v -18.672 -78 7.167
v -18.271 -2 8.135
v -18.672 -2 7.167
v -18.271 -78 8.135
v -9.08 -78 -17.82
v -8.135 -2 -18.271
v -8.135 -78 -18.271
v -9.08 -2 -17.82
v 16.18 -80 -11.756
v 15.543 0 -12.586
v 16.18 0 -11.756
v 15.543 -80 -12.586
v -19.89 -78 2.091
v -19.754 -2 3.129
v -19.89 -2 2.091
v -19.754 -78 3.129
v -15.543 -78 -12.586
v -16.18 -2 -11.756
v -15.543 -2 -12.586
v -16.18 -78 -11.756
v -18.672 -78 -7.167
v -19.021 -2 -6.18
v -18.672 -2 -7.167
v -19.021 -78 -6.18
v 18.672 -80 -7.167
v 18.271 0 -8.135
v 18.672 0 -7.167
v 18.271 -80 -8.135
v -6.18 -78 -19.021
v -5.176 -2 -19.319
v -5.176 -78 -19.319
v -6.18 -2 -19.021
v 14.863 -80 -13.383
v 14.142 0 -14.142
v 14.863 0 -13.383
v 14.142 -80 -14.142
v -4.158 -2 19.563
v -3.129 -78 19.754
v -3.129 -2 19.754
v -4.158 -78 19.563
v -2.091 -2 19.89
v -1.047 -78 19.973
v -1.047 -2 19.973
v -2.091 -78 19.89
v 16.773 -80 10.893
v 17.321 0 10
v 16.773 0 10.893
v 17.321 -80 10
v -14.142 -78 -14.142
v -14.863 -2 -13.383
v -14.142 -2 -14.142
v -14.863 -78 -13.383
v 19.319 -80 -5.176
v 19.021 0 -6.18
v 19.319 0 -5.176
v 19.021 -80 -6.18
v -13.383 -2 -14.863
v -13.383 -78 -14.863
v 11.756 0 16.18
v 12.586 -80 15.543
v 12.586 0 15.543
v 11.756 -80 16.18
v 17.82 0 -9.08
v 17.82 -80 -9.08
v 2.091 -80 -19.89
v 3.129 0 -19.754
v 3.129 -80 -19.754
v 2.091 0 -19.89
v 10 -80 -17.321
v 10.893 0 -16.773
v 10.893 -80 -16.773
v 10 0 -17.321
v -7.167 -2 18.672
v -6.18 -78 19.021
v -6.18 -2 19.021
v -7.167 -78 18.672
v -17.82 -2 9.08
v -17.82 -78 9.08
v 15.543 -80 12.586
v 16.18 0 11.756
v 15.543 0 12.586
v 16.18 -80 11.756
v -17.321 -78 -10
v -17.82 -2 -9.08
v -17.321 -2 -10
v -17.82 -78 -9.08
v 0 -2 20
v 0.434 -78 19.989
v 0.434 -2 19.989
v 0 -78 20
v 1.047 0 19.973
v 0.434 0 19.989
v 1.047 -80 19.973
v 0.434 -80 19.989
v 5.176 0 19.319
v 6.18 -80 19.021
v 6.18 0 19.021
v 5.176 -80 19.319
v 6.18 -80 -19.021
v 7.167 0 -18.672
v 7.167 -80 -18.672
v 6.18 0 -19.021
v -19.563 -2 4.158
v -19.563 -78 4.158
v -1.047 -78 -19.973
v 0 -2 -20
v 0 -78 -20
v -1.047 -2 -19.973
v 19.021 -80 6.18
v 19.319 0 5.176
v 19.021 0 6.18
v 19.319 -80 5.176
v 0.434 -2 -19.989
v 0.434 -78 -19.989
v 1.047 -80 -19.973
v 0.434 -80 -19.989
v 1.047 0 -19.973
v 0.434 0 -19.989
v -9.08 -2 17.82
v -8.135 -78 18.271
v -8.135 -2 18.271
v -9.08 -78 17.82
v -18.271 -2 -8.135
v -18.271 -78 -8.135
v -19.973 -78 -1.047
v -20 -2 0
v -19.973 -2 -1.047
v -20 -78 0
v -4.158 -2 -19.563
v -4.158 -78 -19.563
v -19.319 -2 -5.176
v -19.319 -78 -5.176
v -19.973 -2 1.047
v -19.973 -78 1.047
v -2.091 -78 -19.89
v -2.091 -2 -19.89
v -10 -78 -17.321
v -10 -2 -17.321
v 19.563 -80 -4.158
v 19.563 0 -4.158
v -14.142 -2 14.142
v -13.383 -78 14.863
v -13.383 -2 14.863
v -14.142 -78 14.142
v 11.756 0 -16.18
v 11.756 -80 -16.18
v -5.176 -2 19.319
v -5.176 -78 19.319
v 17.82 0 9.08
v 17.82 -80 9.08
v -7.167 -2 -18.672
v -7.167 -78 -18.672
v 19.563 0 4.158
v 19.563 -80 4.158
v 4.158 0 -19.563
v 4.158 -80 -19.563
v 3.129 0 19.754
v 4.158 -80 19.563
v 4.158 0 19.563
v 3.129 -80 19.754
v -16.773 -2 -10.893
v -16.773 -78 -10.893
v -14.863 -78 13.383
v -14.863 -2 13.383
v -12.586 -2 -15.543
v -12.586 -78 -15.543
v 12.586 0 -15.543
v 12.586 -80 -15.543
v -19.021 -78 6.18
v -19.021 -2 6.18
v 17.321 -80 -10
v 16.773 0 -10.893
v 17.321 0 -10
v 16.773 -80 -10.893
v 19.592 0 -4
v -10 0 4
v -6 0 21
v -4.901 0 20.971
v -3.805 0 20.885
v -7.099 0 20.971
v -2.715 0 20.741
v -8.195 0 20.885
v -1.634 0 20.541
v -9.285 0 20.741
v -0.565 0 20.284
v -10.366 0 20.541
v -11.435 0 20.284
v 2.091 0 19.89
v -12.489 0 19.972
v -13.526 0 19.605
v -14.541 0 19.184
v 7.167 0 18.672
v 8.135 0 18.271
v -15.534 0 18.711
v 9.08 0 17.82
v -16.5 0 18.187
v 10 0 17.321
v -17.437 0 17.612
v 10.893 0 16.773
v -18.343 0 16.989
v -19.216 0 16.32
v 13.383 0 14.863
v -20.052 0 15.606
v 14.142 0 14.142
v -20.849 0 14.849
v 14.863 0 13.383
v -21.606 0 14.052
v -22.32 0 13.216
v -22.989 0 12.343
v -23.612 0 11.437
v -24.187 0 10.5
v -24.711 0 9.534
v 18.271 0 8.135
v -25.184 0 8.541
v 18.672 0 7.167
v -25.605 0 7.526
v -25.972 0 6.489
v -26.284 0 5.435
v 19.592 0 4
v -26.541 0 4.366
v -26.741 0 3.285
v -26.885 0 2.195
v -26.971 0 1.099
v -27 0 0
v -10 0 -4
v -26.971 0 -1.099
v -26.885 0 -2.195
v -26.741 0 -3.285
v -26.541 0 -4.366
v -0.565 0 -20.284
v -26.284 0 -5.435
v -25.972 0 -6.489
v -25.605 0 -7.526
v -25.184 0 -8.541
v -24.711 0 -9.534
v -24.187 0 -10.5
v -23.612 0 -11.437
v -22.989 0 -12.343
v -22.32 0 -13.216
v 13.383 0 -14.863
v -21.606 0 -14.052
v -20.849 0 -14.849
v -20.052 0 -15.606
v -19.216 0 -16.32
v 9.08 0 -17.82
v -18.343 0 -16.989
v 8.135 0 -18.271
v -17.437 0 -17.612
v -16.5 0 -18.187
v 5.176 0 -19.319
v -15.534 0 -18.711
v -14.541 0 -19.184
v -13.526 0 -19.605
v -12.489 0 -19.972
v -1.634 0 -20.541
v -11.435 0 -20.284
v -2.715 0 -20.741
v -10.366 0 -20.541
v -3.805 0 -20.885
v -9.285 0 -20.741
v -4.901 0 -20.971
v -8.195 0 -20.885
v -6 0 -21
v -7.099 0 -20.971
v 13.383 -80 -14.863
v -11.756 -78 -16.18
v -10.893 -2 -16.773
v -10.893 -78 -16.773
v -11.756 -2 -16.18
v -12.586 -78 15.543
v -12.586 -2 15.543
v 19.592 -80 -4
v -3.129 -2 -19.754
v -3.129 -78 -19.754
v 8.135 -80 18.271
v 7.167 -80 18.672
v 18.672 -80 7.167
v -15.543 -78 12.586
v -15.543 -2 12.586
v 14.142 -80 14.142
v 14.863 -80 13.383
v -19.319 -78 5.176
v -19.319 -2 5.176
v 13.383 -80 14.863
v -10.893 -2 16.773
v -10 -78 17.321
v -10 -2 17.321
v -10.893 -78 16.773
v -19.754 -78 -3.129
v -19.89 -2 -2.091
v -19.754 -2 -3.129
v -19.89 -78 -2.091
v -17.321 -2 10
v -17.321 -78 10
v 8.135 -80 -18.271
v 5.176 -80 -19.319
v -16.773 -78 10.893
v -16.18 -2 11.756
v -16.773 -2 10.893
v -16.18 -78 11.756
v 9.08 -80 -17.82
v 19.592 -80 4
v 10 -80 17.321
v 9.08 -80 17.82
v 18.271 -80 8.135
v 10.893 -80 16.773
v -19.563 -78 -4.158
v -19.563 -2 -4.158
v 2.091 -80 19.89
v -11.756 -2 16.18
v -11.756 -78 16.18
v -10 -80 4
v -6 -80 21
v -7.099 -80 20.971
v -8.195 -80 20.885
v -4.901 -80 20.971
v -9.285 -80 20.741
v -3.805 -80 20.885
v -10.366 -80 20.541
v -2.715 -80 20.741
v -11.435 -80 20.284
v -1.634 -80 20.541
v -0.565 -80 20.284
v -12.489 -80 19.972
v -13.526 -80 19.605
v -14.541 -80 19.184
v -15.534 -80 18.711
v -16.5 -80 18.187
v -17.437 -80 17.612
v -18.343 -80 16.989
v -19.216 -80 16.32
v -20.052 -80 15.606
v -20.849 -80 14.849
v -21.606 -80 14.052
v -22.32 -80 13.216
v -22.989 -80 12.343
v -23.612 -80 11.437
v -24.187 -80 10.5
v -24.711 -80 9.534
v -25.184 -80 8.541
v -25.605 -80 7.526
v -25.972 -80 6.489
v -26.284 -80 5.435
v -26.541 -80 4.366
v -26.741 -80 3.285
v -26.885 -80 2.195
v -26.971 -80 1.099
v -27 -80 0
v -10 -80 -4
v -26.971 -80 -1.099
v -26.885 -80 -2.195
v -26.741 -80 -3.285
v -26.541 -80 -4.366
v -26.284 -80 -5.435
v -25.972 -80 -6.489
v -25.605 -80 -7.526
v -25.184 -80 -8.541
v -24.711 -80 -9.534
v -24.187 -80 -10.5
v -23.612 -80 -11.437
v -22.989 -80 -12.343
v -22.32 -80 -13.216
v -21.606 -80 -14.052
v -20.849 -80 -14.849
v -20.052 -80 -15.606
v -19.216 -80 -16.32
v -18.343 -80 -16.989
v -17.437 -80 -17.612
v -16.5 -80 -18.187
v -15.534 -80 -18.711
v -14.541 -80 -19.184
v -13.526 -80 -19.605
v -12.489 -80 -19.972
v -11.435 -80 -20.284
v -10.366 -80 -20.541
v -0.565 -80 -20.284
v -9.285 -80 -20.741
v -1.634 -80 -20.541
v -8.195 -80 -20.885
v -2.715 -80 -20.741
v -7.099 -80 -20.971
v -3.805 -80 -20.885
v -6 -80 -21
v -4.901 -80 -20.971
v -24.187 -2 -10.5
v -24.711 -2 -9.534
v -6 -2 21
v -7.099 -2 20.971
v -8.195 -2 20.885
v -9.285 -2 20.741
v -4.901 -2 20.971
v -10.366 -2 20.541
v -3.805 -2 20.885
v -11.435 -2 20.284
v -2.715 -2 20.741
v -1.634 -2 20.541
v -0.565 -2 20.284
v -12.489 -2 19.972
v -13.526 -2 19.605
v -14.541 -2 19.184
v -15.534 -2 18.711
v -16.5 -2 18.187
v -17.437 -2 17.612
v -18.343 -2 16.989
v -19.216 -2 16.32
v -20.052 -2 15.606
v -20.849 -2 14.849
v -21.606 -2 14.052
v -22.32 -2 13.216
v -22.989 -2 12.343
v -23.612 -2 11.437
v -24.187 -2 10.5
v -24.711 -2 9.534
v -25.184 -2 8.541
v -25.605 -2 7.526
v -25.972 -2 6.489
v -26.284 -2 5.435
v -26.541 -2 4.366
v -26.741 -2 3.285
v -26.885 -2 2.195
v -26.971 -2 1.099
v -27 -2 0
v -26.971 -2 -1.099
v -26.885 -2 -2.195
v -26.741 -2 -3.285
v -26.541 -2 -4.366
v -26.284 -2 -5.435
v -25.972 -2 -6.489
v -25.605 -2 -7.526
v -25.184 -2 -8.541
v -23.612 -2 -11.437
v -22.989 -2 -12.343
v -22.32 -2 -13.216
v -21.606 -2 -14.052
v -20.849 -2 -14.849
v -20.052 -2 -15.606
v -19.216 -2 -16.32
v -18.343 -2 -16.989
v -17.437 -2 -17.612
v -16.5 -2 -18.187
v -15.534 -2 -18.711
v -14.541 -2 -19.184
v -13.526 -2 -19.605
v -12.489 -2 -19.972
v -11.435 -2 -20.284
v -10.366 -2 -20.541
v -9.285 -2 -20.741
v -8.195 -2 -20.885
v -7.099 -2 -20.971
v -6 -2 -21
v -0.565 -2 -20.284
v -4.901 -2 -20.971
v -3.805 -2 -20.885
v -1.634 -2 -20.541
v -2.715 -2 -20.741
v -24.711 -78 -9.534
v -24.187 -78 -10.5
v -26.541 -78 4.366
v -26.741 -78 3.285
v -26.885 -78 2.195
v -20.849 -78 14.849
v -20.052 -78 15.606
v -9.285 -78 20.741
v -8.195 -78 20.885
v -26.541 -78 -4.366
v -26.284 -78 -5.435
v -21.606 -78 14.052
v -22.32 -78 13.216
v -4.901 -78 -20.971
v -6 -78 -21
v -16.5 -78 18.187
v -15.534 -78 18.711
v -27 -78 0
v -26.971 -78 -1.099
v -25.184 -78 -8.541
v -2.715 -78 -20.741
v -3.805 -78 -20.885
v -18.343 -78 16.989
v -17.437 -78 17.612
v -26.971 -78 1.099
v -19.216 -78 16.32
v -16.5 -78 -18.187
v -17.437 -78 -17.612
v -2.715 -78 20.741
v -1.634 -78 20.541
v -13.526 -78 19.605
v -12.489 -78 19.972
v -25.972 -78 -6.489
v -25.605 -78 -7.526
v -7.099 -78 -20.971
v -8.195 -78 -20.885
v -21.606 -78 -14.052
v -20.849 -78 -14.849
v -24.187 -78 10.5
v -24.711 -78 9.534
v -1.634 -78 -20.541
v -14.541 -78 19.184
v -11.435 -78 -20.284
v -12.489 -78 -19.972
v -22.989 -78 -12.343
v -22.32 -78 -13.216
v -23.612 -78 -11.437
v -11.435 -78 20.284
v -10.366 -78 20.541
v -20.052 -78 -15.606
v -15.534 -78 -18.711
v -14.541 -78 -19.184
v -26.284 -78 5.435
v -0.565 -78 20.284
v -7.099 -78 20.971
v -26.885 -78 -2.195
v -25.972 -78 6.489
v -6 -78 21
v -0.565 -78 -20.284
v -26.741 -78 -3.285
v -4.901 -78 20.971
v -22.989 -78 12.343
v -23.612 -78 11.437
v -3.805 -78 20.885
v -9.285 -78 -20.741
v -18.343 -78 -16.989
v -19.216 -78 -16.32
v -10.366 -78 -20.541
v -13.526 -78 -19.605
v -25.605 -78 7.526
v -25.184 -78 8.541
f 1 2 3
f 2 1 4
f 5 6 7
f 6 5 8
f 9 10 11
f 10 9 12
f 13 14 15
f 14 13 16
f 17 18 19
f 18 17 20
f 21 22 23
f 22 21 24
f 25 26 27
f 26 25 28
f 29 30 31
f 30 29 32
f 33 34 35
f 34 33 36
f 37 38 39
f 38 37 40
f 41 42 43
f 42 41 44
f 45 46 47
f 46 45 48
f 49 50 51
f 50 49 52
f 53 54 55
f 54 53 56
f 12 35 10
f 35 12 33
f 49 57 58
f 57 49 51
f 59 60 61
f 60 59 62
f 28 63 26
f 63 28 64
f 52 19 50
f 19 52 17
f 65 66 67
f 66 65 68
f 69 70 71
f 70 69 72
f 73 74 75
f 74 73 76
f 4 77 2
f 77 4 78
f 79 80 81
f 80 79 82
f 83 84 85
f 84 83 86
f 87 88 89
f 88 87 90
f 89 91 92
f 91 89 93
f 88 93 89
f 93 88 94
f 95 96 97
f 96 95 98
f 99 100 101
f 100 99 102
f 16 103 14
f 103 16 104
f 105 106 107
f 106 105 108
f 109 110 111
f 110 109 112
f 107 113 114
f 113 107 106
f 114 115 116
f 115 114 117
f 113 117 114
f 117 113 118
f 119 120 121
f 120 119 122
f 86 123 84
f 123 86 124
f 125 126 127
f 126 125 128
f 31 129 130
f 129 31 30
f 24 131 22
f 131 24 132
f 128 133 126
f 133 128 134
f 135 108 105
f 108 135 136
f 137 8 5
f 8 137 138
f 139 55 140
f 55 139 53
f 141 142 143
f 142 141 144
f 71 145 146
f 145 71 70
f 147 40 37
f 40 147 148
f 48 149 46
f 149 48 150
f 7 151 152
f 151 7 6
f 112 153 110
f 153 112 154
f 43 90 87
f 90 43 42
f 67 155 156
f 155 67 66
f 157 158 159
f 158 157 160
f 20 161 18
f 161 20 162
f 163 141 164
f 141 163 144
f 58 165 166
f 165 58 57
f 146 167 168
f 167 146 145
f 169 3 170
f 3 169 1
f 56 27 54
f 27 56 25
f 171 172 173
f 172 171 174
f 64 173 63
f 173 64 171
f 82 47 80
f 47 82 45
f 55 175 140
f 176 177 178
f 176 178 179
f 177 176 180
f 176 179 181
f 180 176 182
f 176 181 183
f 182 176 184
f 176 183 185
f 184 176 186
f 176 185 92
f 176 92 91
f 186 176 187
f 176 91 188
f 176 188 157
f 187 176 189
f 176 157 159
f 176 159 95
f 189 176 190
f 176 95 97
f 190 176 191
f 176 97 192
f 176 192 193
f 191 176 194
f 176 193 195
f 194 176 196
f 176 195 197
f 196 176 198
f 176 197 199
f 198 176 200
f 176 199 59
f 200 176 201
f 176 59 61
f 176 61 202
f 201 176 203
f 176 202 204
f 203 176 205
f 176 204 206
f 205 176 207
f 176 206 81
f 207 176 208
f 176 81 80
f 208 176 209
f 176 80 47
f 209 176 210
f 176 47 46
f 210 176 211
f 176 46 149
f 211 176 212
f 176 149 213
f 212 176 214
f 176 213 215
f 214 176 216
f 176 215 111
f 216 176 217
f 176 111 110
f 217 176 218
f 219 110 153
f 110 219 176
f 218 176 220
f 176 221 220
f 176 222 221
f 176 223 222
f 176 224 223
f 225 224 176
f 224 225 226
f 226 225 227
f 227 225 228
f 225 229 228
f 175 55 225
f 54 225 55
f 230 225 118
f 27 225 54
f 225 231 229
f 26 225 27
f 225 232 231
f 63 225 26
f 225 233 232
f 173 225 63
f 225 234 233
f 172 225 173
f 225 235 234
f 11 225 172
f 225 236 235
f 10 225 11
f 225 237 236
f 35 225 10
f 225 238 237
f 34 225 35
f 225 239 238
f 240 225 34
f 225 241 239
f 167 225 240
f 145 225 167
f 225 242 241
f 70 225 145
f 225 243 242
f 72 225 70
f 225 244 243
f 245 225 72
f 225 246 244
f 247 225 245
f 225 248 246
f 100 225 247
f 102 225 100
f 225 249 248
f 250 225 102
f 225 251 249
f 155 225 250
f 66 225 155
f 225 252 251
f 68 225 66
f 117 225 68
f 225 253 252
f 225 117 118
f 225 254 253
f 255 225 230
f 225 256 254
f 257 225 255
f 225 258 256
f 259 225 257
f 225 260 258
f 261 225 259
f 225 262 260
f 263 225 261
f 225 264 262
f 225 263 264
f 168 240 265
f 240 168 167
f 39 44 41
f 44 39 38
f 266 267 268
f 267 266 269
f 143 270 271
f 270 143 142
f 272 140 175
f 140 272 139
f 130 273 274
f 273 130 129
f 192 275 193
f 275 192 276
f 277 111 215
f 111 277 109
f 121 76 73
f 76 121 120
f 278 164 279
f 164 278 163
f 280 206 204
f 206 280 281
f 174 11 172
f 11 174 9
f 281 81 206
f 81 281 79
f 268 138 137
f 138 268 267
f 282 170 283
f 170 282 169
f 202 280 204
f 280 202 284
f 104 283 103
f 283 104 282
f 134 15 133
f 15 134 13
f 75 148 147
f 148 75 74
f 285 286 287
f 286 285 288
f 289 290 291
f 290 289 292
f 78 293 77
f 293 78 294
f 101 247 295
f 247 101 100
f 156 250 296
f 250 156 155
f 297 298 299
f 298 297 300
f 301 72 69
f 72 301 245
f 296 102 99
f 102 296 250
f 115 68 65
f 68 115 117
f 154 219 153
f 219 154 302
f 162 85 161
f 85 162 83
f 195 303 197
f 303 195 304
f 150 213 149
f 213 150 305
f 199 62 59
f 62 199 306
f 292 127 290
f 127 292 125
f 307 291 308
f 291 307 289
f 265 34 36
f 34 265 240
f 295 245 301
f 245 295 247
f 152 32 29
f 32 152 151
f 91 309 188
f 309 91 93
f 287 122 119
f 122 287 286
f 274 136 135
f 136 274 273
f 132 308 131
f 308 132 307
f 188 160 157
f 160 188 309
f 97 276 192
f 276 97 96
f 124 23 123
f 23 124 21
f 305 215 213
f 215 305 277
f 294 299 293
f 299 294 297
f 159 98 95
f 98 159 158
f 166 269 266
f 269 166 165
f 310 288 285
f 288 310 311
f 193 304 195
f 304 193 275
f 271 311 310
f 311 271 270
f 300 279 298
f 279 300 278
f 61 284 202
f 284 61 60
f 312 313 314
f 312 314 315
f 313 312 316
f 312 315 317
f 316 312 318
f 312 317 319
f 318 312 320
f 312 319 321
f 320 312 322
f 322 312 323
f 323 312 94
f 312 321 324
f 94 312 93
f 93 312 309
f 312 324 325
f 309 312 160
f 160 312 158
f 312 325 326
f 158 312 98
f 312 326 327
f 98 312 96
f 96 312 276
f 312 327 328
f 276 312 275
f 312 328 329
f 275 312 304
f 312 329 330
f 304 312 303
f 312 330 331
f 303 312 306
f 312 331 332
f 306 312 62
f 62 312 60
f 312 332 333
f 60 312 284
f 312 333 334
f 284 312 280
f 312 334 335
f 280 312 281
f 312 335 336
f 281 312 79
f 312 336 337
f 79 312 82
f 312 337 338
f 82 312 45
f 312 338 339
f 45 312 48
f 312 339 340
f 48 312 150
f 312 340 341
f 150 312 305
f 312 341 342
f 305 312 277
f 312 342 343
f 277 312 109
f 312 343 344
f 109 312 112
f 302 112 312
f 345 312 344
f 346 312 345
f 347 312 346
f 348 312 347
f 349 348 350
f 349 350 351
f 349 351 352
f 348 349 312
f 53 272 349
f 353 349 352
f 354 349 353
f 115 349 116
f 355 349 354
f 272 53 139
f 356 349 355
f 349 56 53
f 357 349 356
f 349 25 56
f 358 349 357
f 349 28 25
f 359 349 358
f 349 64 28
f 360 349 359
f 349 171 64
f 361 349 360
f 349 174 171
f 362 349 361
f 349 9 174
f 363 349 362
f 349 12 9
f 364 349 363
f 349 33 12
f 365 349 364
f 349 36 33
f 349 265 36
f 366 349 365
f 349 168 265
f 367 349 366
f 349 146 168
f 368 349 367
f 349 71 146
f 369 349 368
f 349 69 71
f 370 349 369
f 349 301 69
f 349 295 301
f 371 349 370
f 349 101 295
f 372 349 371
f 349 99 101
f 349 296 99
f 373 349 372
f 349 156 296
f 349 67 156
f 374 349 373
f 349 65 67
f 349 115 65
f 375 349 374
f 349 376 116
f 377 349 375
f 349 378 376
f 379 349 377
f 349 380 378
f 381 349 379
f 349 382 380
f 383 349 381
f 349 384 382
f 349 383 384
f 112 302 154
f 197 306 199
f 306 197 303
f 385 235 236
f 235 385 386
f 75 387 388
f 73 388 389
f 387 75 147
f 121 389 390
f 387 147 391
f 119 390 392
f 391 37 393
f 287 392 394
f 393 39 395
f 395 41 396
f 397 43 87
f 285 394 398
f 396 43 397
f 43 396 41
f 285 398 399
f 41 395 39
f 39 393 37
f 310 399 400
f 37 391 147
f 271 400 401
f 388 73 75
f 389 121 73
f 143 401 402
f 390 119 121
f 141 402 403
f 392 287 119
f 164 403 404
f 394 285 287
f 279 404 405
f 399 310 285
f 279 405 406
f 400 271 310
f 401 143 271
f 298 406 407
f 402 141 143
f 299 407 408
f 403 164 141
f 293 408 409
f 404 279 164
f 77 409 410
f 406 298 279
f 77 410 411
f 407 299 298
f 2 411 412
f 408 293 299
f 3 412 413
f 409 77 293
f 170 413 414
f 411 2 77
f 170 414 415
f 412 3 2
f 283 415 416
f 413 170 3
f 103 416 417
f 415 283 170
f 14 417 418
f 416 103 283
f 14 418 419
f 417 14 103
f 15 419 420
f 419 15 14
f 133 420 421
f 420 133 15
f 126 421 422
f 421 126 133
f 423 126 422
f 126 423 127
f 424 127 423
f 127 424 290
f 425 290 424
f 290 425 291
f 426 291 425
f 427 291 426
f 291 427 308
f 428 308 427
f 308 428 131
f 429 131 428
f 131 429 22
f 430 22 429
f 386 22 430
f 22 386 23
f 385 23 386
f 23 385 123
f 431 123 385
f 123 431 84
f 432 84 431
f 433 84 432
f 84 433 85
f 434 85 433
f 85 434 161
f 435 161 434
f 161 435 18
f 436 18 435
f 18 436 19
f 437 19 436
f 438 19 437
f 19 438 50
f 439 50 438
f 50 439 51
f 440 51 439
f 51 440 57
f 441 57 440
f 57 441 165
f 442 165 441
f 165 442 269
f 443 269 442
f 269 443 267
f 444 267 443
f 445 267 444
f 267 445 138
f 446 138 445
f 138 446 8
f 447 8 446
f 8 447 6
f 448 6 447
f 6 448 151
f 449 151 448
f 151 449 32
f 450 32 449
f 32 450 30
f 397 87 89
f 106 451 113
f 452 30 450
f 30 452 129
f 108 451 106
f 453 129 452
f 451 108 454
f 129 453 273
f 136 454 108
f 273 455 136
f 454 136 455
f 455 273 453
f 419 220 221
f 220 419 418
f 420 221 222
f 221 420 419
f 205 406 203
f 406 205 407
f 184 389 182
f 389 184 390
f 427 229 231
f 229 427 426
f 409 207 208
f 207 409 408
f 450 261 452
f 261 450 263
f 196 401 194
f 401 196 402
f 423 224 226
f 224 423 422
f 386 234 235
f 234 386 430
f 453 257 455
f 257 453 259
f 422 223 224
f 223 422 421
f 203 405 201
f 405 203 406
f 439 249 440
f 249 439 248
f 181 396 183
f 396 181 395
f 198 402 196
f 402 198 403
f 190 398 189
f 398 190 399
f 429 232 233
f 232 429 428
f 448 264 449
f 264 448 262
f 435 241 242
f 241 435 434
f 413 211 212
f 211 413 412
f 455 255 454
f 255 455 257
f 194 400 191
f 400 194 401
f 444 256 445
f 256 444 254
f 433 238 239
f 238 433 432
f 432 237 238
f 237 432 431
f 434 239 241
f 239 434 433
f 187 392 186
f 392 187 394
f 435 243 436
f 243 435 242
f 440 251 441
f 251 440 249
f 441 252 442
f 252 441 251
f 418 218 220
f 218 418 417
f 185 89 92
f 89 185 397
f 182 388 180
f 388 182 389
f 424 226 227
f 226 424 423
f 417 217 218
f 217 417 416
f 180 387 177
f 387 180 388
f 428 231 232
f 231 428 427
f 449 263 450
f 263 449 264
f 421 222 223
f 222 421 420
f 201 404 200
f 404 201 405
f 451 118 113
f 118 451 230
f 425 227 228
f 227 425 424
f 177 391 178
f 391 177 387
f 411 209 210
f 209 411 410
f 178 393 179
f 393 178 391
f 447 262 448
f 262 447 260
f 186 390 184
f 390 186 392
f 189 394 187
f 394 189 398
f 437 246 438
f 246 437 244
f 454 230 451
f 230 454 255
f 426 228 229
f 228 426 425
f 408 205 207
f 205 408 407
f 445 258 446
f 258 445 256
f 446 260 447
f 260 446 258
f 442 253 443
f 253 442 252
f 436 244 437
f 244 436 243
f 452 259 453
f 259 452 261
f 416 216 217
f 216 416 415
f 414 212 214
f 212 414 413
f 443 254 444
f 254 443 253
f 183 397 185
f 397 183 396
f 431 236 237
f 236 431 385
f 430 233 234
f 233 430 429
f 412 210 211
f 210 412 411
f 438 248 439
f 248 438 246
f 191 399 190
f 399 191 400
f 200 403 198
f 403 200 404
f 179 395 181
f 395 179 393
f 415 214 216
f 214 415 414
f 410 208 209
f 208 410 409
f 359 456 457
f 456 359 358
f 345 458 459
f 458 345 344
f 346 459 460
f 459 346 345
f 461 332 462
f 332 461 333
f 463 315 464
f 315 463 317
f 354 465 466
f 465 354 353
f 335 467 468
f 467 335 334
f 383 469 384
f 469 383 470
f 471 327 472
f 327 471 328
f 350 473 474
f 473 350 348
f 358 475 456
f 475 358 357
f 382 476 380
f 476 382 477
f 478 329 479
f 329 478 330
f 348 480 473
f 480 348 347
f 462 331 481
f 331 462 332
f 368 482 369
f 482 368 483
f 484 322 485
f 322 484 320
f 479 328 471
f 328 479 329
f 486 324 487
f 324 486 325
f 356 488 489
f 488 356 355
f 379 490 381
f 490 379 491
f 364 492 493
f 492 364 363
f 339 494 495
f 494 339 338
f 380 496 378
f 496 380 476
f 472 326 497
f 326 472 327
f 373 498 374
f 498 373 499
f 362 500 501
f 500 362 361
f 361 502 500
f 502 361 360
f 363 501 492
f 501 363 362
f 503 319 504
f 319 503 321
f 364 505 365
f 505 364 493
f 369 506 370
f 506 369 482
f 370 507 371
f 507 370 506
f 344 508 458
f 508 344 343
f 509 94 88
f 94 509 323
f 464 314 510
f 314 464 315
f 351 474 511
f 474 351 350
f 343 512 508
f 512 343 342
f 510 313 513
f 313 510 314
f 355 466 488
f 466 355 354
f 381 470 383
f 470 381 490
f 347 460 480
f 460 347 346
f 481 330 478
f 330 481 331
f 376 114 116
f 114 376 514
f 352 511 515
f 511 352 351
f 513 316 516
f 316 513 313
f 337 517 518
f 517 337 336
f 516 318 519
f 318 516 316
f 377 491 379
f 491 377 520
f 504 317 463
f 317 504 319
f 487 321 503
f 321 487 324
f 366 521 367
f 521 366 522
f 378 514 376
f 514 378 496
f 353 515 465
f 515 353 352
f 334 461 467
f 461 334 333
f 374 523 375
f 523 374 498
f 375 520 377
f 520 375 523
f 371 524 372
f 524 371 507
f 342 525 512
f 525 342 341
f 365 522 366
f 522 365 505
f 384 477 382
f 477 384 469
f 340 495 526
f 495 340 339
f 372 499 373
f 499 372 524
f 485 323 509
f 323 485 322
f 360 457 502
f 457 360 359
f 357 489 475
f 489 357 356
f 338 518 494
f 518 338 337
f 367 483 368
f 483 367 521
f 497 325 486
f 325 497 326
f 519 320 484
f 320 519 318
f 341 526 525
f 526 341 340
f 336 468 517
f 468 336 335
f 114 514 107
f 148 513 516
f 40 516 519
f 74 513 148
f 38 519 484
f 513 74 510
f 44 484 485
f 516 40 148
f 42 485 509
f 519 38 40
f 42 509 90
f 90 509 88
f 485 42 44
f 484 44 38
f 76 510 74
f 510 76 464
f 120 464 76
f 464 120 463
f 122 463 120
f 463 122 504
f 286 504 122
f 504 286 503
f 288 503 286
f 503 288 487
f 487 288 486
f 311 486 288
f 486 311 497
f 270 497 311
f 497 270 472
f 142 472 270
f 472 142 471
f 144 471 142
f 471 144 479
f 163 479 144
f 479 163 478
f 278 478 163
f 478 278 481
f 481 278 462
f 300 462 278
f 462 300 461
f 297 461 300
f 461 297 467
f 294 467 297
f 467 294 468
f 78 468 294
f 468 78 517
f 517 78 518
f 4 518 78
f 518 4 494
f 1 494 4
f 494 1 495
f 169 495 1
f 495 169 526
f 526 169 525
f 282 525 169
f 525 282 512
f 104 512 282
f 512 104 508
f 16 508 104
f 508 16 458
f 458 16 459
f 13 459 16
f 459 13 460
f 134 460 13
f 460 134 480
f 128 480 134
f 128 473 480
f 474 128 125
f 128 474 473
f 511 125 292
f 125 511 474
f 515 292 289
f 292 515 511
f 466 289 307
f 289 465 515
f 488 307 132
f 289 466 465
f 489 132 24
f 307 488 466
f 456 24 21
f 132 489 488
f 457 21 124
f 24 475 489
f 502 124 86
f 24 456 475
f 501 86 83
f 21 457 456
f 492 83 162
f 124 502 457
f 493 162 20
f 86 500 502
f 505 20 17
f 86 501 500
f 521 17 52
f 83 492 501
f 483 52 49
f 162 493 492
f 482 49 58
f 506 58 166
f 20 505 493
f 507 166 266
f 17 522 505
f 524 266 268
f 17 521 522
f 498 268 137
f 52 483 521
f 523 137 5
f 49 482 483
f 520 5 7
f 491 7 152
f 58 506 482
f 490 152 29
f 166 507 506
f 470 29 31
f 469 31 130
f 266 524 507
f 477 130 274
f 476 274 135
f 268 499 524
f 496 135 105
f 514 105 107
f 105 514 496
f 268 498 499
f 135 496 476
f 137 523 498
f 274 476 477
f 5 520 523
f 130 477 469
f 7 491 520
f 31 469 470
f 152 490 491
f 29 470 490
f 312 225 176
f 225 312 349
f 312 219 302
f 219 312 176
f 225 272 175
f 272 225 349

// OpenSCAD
module tube(diameter, length) {
  radius = diameter / 2;
  linear_extrude(height = length)
  circle(r = radius);
}

$fn=120;
length=80;

rotate([90,0,0])
difference(){
  union(){
    tube(40,length);
    translate([-6,0,0])
    tube(42,2);
    translate([-6,0,length-2])
    tube(42,2);

  }
  translate([-10,-4,-5])
  cube([30,8,90]);
}
